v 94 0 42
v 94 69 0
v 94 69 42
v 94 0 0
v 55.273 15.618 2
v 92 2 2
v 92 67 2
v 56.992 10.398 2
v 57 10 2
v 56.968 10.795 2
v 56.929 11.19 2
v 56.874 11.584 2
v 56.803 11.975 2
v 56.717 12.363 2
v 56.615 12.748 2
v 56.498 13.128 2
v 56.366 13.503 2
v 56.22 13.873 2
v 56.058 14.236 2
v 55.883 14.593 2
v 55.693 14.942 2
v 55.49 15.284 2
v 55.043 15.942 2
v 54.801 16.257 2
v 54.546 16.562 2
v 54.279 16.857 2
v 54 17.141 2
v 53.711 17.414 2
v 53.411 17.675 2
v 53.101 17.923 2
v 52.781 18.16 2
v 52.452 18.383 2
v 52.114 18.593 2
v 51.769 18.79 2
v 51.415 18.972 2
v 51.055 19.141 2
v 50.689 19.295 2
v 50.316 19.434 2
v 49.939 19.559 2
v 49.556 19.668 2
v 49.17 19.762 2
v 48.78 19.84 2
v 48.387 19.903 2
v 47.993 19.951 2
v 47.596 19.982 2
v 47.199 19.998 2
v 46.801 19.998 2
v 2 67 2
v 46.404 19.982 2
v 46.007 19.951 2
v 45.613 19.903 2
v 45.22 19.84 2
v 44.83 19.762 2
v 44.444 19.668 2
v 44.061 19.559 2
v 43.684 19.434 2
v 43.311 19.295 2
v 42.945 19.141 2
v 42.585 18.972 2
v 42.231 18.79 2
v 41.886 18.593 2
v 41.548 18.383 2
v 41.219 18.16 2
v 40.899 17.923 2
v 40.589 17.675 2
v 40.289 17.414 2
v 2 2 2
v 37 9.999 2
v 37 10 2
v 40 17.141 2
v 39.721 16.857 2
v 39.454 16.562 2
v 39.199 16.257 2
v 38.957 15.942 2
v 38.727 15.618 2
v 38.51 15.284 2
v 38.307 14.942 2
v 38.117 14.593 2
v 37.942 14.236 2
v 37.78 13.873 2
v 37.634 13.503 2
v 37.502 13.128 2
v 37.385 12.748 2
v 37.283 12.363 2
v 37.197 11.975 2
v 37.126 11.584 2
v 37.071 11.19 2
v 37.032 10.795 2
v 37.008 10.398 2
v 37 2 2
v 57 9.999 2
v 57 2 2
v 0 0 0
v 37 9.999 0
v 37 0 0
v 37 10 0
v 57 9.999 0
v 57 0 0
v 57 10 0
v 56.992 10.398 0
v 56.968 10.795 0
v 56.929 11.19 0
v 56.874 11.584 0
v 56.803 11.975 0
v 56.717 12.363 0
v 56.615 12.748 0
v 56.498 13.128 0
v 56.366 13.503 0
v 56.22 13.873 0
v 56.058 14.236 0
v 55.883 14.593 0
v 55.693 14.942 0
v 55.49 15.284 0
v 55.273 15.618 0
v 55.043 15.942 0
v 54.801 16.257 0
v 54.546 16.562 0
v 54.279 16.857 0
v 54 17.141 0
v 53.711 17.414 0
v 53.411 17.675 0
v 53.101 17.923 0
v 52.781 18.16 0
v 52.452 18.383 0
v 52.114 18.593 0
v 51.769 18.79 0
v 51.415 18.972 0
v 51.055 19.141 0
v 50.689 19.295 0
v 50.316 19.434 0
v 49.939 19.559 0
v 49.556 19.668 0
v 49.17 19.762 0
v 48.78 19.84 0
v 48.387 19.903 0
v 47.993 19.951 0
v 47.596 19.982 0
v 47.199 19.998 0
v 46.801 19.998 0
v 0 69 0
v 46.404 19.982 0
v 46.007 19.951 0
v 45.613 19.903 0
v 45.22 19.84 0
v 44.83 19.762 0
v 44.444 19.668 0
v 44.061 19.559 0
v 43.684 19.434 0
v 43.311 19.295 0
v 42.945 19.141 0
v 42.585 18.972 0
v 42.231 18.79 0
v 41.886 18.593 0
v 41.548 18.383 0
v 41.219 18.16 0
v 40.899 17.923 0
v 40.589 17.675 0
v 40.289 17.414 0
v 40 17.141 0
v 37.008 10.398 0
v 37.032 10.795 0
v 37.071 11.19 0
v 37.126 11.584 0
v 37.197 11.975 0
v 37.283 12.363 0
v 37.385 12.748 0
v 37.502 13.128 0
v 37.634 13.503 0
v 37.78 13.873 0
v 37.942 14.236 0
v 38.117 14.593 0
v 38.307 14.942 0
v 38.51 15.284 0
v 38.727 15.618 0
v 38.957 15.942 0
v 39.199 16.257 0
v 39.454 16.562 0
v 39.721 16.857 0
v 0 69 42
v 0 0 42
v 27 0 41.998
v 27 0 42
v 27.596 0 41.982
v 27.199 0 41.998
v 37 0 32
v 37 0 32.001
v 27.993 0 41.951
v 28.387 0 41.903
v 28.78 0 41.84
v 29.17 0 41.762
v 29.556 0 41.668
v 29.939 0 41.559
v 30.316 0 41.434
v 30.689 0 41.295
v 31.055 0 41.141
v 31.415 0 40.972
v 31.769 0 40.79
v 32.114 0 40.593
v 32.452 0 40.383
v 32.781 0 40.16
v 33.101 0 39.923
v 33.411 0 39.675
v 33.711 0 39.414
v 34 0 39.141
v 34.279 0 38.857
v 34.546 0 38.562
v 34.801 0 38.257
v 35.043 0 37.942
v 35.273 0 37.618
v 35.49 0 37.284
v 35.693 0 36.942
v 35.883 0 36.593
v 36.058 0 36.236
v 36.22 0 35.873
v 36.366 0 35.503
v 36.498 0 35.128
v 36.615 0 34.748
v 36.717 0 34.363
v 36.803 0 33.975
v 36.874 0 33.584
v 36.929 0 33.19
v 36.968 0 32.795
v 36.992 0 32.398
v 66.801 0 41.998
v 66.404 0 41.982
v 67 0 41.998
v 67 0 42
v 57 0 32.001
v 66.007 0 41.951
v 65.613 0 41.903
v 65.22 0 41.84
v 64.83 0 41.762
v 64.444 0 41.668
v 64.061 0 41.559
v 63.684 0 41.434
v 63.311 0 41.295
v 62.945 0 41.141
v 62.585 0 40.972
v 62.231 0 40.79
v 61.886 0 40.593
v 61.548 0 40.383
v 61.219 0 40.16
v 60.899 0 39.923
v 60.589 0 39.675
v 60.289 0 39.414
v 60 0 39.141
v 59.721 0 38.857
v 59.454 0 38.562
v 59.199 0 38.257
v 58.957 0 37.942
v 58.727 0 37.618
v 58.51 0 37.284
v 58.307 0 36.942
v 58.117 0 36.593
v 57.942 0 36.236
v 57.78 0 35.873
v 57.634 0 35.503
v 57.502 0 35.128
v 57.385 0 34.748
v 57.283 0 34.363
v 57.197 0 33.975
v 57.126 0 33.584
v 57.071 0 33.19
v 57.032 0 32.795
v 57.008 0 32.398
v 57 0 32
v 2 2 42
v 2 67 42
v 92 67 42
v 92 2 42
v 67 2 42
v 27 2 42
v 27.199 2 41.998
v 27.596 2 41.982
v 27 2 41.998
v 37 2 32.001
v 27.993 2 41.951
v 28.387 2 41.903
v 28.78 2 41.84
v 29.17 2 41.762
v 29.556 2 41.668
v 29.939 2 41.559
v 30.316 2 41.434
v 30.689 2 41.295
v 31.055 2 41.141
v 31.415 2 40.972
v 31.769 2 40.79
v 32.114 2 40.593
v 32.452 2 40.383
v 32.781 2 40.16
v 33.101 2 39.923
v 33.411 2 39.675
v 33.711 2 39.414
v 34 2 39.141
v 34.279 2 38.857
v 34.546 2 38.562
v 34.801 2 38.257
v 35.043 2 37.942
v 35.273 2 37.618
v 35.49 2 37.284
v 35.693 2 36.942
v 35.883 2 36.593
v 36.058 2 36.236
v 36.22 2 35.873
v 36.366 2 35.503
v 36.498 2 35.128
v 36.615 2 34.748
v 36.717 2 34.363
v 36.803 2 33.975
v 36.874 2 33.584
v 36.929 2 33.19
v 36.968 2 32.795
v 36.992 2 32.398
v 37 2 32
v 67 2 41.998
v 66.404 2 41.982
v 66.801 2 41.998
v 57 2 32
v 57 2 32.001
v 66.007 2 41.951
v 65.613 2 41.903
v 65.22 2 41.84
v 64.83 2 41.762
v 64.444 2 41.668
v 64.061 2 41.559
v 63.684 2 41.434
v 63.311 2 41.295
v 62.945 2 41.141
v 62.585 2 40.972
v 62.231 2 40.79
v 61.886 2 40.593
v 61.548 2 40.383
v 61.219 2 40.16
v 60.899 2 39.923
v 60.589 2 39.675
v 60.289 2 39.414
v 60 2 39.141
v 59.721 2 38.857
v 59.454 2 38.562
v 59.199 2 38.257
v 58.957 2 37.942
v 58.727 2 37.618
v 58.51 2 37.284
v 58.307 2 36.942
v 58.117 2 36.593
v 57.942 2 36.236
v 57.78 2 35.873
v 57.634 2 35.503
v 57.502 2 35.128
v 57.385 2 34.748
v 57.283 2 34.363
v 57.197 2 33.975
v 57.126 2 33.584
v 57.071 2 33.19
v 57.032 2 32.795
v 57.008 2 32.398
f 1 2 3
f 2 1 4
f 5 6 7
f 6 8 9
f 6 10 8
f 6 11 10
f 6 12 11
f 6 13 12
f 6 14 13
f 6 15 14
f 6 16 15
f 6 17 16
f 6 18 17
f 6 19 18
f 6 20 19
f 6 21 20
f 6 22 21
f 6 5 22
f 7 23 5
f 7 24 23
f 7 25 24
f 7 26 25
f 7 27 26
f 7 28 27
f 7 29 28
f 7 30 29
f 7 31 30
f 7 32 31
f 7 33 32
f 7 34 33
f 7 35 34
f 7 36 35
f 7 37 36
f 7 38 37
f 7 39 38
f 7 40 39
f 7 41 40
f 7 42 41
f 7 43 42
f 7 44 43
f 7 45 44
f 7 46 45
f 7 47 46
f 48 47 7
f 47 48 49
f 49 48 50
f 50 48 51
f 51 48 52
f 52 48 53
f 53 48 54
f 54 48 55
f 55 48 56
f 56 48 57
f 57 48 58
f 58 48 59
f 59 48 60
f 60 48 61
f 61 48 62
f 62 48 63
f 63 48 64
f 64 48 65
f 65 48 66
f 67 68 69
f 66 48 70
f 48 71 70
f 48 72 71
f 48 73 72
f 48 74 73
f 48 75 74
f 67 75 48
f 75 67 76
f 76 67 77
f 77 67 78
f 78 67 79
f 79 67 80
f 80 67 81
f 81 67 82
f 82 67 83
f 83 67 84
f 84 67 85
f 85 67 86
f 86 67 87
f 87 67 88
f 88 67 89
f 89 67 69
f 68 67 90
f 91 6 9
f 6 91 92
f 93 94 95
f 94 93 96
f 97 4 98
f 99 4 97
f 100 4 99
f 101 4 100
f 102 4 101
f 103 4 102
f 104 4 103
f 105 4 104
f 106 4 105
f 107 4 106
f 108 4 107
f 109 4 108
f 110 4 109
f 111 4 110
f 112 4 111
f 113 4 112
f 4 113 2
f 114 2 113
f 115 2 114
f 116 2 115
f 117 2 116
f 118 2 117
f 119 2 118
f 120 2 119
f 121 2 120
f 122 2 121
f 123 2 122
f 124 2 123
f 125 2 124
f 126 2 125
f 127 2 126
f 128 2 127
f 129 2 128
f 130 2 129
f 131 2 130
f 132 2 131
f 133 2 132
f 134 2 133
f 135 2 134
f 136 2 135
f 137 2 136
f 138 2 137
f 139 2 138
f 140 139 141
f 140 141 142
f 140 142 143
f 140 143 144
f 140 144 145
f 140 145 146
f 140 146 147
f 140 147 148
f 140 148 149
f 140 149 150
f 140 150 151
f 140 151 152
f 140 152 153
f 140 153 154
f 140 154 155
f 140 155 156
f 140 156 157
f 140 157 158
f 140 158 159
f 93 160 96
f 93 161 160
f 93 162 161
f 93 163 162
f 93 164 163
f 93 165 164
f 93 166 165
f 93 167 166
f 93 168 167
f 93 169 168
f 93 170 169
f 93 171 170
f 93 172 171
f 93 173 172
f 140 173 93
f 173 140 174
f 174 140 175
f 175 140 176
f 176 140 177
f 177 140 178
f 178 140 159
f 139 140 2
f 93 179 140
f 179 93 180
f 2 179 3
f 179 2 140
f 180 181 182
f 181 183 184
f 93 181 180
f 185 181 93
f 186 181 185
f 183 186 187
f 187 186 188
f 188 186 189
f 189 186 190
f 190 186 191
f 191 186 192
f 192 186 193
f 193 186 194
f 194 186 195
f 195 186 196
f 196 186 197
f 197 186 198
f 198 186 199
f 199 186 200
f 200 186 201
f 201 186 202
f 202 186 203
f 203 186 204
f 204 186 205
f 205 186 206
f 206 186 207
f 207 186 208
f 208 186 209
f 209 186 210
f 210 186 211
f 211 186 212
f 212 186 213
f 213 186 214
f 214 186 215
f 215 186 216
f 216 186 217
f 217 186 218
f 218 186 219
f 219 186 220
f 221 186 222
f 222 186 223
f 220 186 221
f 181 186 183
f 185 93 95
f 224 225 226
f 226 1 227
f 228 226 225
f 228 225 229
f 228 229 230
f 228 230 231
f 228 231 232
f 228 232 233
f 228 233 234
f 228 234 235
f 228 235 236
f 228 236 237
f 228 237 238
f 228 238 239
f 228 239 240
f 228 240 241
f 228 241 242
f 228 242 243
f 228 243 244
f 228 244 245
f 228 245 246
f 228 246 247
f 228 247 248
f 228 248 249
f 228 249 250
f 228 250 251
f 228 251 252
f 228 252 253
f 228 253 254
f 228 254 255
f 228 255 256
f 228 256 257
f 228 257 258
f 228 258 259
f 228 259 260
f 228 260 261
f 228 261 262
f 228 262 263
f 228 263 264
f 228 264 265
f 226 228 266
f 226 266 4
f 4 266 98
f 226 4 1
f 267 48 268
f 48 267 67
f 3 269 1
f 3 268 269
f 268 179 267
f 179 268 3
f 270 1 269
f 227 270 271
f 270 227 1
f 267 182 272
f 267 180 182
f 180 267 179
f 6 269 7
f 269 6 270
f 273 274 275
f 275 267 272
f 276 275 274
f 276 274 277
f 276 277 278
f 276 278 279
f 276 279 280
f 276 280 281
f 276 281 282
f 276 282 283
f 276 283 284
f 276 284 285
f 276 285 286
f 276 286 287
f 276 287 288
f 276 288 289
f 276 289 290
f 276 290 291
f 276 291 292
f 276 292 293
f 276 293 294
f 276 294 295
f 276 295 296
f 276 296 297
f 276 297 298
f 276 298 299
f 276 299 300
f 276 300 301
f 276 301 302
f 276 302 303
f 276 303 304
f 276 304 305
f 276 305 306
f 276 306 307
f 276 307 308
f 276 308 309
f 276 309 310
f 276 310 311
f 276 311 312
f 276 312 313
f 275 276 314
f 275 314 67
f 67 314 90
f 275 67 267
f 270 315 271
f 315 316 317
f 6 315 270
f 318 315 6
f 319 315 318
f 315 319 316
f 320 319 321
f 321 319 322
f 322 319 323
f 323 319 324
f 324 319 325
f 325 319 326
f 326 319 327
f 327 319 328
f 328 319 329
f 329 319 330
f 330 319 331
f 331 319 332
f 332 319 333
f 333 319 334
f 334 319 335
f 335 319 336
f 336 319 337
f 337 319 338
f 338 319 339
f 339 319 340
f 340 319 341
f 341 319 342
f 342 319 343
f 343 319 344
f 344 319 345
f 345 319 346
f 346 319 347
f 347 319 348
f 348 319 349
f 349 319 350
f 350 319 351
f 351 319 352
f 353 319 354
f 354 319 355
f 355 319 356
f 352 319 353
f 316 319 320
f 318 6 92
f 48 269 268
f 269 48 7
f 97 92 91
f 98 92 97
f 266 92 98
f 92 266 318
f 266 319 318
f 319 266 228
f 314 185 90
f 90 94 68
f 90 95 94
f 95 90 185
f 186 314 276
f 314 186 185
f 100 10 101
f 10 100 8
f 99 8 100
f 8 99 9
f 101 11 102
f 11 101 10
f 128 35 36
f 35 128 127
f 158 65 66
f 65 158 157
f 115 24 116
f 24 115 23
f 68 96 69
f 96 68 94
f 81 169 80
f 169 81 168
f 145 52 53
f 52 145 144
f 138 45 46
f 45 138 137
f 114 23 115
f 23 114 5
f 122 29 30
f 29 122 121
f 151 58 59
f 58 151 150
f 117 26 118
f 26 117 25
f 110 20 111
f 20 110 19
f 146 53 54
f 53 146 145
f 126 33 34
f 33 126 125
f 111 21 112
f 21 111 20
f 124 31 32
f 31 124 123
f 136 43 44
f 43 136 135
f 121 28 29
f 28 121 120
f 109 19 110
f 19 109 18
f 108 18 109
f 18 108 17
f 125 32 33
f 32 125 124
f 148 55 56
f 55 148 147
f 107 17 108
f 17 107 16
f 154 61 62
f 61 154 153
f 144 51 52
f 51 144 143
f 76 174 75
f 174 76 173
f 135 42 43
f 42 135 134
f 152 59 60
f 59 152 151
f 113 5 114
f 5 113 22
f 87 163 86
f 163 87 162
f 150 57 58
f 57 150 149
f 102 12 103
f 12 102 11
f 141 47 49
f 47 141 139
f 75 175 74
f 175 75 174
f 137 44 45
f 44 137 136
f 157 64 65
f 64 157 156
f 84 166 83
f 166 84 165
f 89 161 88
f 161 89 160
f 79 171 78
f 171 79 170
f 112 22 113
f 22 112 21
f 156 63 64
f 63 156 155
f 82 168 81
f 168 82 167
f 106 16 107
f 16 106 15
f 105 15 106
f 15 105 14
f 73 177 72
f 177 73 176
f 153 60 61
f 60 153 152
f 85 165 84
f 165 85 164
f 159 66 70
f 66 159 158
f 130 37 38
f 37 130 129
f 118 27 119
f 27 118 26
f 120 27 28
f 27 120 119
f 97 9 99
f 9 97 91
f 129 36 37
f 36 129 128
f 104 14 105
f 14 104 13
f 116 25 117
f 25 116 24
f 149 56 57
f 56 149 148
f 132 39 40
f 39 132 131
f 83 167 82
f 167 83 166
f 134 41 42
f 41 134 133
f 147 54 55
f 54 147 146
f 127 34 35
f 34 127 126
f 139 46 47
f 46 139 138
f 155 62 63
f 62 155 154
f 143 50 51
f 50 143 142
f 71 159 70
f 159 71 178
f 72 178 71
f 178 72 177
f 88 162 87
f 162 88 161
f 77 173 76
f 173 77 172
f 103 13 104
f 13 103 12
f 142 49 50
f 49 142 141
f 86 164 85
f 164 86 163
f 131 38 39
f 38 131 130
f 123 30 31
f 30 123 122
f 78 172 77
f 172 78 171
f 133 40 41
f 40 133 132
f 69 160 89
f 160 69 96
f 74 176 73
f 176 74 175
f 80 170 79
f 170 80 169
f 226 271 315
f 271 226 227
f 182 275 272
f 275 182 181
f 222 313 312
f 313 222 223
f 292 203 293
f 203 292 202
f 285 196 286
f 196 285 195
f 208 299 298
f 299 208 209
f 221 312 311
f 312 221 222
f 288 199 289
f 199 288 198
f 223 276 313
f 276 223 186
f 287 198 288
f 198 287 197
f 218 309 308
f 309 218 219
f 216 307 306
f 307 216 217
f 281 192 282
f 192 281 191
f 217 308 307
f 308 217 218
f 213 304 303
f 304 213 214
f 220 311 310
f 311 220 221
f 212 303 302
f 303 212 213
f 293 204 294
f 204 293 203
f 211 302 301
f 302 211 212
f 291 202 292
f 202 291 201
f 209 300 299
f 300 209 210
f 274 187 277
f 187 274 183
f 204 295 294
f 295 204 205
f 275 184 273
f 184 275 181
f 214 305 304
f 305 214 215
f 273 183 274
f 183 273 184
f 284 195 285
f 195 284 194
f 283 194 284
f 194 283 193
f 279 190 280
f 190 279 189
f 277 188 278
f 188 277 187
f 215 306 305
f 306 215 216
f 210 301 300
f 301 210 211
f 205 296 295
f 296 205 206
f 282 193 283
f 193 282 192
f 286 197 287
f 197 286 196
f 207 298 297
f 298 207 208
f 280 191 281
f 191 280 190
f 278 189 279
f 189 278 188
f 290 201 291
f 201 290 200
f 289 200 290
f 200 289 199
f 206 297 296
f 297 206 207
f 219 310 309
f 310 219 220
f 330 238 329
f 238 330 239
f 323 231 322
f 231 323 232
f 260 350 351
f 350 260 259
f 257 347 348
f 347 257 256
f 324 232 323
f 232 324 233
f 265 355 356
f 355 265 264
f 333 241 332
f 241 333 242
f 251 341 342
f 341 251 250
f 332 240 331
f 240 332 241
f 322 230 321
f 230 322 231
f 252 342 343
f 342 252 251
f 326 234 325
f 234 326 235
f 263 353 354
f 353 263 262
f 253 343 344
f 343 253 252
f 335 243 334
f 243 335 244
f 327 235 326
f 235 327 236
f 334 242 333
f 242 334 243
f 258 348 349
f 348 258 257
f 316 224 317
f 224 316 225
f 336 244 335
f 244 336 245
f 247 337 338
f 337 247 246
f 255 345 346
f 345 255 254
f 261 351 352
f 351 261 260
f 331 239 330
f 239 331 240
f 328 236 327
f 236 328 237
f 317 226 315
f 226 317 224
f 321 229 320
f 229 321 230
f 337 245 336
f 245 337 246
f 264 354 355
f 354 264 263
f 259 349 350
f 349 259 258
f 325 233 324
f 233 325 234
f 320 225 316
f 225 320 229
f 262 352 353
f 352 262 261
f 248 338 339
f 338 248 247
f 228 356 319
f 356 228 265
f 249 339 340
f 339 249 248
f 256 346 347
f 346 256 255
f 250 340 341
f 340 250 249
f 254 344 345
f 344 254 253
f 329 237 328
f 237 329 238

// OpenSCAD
// file: stackable_box.scad
use <card_holder.scad>
$fa = 1;
$fs = 0.4;
module base(length=60,width=40,thickness=2,max_angle=30) {
    w = thickness*tan(max_angle);
    polyhedron(
        points=[ 
            [0,0,0],
            [width,0,0],
            [width,length,0],
            [0,length,0],
            [w,w,-thickness],
            [width-w,w,-thickness],
            [width-w,length-w,-thickness],
            [w,length-w,-thickness]
        ],
        faces = [
            [0,3,2,1],
            [0,1,5,4],
            [1,2,6,5],
            [2,3,7,6],
            [3,0,4,7],
            [4,5,6,7]
        ]
    );
};
module stackable_box_lid(length=60,width=40,thickness=2,tolerance=0.5, max_angle=30) {
    d=0.001;
    //base
    translate([0,0,0]) union () {
        cube([width,length,thickness]);
        base(length,width,thickness,max_angle);
    };
};
module stackable_box(length=60,width=40,height=30,thickness=2,tolerance=0.5,bottom=false, max_angle=30) {
    difference() {
        union() {
            cube([width,length,thickness]);
            if (!bottom) { base(length=length,width=width,thickness=thickness,max_angle=max_angle); }
            cube([width,thickness,height]);
            cube([thickness,length,height]);
            translate([0,length-thickness,0]) cube([width,thickness,height]);
            translate([width-thickness,0,0]) cube([thickness,length,height]);
        };
        translate([0,0,height]) base(length=length,width=width,thickness=thickness,max_angle=max_angle);
    };
};



// Critter pieces box (x10)
//stackable_box(width=58, length=67.5, height=15);

// Special event card & forest card boxes (x2)
//card_holder(card_width=46, card_height=65, height=28, stackable=true);

// Card holders for expansion cards (x1)
//card_holder(card_width=46, card_height=65, height=15, stackable=true); 
card_holder(card_width=46, card_height=65, height=11, stackable=true);

//base(thickness=2);
// main file
use <stackable_box.scad>
$fa = 1;
$fs = 0.4;
module slot(width,depth,height,thickness,rounded_slot=true) {
    difference() {
        union () {
            translate([-width/2,-0.001,thickness]) cube([width,thickness+0.002,height]);
            translate([0,depth-width/2,-thickness-0.001]) cylinder(d=width,h=2*thickness+0.003);
            translate([-width/2,-0.001,-thickness-0.001]) cube([width,depth-width/2,2*thickness+0.003]);
            //Cutout in preparation for rounded edges
            if (rounded_slot) {translate([-width,-0.001,height-width/2+0.001]) cube([width*2,thickness+0.002,width/2+0.002]);}
        };
        //Rounded edges of slot
        if (rounded_slot) {
            translate([-width,thickness+0.003,height-width/2]) rotate([90,0,0]) cylinder(d=width,h=thickness+0.004);
            translate([width,thickness+0.003,height-width/2]) rotate([90,0,0]) cylinder(d=width,h=thickness+0.004);
        }
    };
};
module card_holder(card_width=64,card_height=89,thickness=2,height=40,slot_width=20,slot_depth=20,tolerance=0.5,slots=[1,0,0,0],rounded_slot=true,stackable=false,max_angle=30) {
    card_height=card_height+2*tolerance;
    card_width=card_width+2*tolerance;
    base_height=2*thickness+card_height;
    base_width=2*thickness+card_width;
    full_height=thickness+height;
    union() {
        difference() {
            union() {
                //base
                cube([base_height,base_width,thickness]);
                if (stackable) { base(length=base_width,width=base_height,thickness=thickness,max_angle=max_angle); }
                //width walls
                cube([thickness,base_width,full_height]);
                translate([base_height-thickness,0,0]) cube([thickness,base_width,full_height]);
                //height walls
                cube([base_height,thickness,full_height]);
                translate([0,base_width-thickness,0]) cube([base_height,thickness,full_height]);
            };
            if(slots[0] == 1) {
                translate([base_height/2,0,0]) slot(width=slot_width,depth=slot_depth,height=full_height,thickness=thickness,rounded_slot=rounded_slot);
            };
            if(slots[1] == 1) {
                translate([0,base_width/2,0]) rotate([0,0,270]) slot(width=slot_width,depth=slot_depth,height=full_height,thickness=thickness,rounded_slot=rounded_slot);
            };
            if(slots[2] == 1) {
                translate([base_height/2,base_width,0]) rotate([0,0,180]) slot(width=slot_width,depth=slot_depth,height=full_height,thickness=thickness,rounded_slot=rounded_slot);
            };
            if(slots[3] == 1) {
                translate([base_height,base_width/2,0]) rotate([0,0,90]) slot(width=slot_width,depth=slot_depth,height=full_height,thickness=thickness,rounded_slot=rounded_slot);
            }
            if(stackable) {translate([0,0,full_height]) base(length=base_width,width=base_height,thickness=thickness,max_angle=max_angle);}
        };
    };
};
card_holder();
//slot(width=20,deph=20,thickness=2,height=30);
